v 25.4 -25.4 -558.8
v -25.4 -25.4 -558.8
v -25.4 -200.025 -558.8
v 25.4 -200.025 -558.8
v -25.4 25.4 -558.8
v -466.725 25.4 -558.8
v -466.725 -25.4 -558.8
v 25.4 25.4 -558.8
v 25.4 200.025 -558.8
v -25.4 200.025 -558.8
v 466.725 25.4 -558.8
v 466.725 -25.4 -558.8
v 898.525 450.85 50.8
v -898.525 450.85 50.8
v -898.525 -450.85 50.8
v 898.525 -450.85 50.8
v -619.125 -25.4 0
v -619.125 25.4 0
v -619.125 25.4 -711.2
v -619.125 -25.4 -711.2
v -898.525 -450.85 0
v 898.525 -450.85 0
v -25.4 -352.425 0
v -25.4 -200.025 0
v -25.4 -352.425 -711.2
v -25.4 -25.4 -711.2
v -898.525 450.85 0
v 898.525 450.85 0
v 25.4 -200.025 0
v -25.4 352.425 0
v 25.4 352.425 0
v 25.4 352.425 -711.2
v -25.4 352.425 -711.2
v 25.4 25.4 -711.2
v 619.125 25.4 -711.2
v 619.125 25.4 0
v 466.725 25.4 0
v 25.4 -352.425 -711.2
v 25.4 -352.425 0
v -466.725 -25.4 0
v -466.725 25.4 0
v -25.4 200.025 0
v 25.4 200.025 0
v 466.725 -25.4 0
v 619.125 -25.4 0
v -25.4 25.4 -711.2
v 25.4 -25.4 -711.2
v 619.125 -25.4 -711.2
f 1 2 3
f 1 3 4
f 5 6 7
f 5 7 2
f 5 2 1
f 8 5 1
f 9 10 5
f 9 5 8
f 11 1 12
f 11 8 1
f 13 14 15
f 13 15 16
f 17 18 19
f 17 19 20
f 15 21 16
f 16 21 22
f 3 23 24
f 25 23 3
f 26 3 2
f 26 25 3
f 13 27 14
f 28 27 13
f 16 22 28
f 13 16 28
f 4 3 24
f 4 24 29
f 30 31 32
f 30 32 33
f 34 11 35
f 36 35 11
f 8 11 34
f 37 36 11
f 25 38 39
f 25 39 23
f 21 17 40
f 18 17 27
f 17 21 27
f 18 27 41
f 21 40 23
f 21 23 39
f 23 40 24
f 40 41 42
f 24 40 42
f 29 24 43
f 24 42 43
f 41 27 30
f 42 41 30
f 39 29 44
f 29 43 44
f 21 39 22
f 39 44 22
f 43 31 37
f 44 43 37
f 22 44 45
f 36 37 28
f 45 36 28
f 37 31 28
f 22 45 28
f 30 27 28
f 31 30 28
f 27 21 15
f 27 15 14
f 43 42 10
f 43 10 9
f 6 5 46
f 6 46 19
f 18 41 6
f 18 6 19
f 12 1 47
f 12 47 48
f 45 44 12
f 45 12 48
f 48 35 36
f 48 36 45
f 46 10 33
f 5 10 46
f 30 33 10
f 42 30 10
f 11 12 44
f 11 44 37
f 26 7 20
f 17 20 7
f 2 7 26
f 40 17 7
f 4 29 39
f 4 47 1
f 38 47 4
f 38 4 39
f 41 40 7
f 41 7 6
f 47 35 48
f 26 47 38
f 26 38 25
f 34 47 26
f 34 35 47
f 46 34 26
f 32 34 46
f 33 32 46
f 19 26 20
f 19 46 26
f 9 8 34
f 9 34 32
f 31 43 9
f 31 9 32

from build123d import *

# Parameters (mm, degrees)
F0_W     = 1797.05
F0_H     = 901.7
F1_DEPTH = 50.8
F2_W     = 152.4
F2_H     = 50.8
F5_W     = 50.8
F5_H     = 152.4


with BuildPart() as f1:
    # F0 (on Top) → F1 (new body)
    with BuildSketch(Plane.XY):
        Rectangle(F0_W, F0_H)
    extrude(amount=F1_DEPTH)

    # F4: sweep along a path in F3
    with BuildLine(Plane.XZ) as f4_path:
        Line((542.925, 0), (542.925, -635))
        Line((542.925, -635), (-542.925, -635))
        Line((-542.925, -635), (-542.925, 0))
    # F2 (on face) → F4 (sweep)
    with BuildSketch(Plane(origin=(0, 0, 0), x_dir=(1, 0, 0), z_dir=(0, 0, -1))):
        with Locations((542.925, 0)):
            Rectangle(F2_W, F2_H)
    sweep(path=f4_path.line, transition=Transition.RIGHT)

    # F7: sweep along a path in F6
    with BuildLine(Plane.YZ) as f7_path:
        Line((-276.225, 0), (-276.225, -635))
        Line((-276.225, -635), (276.225, -635))
        Line((276.225, -635), (276.225, 0))
    # F5 (on face) → F7 (sweep)
    with BuildSketch(Plane(origin=(0, 0, 0), x_dir=(1, 0, 0), z_dir=(0, 0, -1))):
        with Locations((0, 276.225)):
            Rectangle(F5_W, F5_H)
    sweep(path=f7_path.line, transition=Transition.RIGHT)


solid = f1.part
